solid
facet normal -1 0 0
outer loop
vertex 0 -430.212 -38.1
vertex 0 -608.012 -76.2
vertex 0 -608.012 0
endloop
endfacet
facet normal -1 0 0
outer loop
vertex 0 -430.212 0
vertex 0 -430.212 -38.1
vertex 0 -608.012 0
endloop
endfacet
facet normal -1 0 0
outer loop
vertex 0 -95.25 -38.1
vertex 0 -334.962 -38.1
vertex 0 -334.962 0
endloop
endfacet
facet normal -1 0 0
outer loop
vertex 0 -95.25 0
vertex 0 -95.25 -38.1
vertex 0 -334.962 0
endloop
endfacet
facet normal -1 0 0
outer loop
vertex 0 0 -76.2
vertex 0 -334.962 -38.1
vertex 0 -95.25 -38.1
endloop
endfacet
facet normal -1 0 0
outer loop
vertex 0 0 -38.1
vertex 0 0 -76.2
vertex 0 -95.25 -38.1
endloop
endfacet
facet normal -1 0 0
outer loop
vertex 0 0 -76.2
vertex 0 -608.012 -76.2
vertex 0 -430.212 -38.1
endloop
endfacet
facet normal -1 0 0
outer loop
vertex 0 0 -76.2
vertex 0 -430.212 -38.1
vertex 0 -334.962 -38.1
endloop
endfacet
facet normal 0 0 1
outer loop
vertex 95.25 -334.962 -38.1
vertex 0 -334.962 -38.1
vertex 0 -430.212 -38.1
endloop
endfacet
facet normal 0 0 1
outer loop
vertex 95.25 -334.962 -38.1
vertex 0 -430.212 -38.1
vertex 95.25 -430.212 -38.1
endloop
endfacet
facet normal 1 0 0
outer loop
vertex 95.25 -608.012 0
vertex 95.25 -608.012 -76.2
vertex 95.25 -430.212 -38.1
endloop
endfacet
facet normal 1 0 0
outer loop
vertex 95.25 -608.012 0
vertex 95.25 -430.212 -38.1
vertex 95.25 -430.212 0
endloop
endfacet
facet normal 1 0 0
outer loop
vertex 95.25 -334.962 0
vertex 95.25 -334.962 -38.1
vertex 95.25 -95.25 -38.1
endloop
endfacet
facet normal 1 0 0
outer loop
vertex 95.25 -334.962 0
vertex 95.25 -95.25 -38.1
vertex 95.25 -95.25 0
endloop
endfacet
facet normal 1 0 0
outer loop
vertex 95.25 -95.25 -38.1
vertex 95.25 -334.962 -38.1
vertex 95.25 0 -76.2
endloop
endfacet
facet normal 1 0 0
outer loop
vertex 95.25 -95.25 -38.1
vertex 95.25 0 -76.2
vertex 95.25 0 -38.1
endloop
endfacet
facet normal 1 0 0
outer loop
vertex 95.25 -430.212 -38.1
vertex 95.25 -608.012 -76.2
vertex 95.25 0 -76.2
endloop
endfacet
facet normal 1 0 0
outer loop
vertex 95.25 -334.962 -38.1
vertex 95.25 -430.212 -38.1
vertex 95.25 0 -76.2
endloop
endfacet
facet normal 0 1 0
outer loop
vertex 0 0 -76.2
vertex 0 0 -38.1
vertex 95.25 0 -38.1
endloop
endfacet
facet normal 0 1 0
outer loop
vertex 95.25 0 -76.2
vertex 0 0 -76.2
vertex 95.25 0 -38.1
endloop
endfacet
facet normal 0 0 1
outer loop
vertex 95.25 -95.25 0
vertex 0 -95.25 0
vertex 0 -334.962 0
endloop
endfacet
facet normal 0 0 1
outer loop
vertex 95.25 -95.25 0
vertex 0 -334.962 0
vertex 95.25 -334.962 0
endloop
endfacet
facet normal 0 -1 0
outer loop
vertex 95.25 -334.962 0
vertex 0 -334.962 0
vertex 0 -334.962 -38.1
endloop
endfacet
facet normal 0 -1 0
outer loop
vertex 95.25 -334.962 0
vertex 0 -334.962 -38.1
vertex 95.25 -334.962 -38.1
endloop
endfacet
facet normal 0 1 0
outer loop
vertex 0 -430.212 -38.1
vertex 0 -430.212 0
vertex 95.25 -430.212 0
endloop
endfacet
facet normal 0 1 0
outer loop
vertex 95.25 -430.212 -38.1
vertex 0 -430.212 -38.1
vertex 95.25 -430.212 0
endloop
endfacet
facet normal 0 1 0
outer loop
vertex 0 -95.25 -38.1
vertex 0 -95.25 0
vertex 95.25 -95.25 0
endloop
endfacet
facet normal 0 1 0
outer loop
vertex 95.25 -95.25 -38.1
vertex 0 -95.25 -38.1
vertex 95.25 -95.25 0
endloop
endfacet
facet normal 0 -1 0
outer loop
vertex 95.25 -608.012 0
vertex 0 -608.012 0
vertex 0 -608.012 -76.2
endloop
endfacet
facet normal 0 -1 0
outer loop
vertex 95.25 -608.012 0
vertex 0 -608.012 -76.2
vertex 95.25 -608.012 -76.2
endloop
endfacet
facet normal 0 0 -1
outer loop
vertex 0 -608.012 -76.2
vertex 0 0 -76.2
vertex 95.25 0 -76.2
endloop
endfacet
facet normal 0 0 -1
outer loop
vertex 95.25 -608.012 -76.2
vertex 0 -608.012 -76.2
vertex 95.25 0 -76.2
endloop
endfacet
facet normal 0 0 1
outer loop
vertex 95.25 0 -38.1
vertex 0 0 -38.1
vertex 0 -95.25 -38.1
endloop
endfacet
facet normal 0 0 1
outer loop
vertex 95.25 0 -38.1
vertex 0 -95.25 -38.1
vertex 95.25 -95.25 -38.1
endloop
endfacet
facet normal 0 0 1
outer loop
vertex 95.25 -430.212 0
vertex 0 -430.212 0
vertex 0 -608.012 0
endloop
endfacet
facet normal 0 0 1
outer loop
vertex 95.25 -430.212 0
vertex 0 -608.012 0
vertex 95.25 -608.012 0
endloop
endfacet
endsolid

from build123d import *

# Parameters (mm, degrees)
F0_W     = 95.25
F0_H     = 76.2
F1_DEPTH = 608.0125
F2_W     = 95.25
F2_H     = 95.25
F3_DEPTH = 38.1


with BuildPart() as f1:
    # F0 (on Front) → F1 (new body)
    with BuildSketch(Plane.XZ):
        with Locations((47.625, -38.1)):
            Rectangle(F0_W, F0_H)
    extrude(amount=F1_DEPTH)

    # F2 (on face) → F3 (cut)
    with BuildSketch(Plane.XY):
        with Locations((47.625, -47.625)):
            Rectangle(F2_W, F2_H)
        with Locations((47.625, -382.5875)):
            Rectangle(F2_W, F2_H)
    extrude(amount=-F3_DEPTH, mode=Mode.SUBTRACT)


solid = f1.part
